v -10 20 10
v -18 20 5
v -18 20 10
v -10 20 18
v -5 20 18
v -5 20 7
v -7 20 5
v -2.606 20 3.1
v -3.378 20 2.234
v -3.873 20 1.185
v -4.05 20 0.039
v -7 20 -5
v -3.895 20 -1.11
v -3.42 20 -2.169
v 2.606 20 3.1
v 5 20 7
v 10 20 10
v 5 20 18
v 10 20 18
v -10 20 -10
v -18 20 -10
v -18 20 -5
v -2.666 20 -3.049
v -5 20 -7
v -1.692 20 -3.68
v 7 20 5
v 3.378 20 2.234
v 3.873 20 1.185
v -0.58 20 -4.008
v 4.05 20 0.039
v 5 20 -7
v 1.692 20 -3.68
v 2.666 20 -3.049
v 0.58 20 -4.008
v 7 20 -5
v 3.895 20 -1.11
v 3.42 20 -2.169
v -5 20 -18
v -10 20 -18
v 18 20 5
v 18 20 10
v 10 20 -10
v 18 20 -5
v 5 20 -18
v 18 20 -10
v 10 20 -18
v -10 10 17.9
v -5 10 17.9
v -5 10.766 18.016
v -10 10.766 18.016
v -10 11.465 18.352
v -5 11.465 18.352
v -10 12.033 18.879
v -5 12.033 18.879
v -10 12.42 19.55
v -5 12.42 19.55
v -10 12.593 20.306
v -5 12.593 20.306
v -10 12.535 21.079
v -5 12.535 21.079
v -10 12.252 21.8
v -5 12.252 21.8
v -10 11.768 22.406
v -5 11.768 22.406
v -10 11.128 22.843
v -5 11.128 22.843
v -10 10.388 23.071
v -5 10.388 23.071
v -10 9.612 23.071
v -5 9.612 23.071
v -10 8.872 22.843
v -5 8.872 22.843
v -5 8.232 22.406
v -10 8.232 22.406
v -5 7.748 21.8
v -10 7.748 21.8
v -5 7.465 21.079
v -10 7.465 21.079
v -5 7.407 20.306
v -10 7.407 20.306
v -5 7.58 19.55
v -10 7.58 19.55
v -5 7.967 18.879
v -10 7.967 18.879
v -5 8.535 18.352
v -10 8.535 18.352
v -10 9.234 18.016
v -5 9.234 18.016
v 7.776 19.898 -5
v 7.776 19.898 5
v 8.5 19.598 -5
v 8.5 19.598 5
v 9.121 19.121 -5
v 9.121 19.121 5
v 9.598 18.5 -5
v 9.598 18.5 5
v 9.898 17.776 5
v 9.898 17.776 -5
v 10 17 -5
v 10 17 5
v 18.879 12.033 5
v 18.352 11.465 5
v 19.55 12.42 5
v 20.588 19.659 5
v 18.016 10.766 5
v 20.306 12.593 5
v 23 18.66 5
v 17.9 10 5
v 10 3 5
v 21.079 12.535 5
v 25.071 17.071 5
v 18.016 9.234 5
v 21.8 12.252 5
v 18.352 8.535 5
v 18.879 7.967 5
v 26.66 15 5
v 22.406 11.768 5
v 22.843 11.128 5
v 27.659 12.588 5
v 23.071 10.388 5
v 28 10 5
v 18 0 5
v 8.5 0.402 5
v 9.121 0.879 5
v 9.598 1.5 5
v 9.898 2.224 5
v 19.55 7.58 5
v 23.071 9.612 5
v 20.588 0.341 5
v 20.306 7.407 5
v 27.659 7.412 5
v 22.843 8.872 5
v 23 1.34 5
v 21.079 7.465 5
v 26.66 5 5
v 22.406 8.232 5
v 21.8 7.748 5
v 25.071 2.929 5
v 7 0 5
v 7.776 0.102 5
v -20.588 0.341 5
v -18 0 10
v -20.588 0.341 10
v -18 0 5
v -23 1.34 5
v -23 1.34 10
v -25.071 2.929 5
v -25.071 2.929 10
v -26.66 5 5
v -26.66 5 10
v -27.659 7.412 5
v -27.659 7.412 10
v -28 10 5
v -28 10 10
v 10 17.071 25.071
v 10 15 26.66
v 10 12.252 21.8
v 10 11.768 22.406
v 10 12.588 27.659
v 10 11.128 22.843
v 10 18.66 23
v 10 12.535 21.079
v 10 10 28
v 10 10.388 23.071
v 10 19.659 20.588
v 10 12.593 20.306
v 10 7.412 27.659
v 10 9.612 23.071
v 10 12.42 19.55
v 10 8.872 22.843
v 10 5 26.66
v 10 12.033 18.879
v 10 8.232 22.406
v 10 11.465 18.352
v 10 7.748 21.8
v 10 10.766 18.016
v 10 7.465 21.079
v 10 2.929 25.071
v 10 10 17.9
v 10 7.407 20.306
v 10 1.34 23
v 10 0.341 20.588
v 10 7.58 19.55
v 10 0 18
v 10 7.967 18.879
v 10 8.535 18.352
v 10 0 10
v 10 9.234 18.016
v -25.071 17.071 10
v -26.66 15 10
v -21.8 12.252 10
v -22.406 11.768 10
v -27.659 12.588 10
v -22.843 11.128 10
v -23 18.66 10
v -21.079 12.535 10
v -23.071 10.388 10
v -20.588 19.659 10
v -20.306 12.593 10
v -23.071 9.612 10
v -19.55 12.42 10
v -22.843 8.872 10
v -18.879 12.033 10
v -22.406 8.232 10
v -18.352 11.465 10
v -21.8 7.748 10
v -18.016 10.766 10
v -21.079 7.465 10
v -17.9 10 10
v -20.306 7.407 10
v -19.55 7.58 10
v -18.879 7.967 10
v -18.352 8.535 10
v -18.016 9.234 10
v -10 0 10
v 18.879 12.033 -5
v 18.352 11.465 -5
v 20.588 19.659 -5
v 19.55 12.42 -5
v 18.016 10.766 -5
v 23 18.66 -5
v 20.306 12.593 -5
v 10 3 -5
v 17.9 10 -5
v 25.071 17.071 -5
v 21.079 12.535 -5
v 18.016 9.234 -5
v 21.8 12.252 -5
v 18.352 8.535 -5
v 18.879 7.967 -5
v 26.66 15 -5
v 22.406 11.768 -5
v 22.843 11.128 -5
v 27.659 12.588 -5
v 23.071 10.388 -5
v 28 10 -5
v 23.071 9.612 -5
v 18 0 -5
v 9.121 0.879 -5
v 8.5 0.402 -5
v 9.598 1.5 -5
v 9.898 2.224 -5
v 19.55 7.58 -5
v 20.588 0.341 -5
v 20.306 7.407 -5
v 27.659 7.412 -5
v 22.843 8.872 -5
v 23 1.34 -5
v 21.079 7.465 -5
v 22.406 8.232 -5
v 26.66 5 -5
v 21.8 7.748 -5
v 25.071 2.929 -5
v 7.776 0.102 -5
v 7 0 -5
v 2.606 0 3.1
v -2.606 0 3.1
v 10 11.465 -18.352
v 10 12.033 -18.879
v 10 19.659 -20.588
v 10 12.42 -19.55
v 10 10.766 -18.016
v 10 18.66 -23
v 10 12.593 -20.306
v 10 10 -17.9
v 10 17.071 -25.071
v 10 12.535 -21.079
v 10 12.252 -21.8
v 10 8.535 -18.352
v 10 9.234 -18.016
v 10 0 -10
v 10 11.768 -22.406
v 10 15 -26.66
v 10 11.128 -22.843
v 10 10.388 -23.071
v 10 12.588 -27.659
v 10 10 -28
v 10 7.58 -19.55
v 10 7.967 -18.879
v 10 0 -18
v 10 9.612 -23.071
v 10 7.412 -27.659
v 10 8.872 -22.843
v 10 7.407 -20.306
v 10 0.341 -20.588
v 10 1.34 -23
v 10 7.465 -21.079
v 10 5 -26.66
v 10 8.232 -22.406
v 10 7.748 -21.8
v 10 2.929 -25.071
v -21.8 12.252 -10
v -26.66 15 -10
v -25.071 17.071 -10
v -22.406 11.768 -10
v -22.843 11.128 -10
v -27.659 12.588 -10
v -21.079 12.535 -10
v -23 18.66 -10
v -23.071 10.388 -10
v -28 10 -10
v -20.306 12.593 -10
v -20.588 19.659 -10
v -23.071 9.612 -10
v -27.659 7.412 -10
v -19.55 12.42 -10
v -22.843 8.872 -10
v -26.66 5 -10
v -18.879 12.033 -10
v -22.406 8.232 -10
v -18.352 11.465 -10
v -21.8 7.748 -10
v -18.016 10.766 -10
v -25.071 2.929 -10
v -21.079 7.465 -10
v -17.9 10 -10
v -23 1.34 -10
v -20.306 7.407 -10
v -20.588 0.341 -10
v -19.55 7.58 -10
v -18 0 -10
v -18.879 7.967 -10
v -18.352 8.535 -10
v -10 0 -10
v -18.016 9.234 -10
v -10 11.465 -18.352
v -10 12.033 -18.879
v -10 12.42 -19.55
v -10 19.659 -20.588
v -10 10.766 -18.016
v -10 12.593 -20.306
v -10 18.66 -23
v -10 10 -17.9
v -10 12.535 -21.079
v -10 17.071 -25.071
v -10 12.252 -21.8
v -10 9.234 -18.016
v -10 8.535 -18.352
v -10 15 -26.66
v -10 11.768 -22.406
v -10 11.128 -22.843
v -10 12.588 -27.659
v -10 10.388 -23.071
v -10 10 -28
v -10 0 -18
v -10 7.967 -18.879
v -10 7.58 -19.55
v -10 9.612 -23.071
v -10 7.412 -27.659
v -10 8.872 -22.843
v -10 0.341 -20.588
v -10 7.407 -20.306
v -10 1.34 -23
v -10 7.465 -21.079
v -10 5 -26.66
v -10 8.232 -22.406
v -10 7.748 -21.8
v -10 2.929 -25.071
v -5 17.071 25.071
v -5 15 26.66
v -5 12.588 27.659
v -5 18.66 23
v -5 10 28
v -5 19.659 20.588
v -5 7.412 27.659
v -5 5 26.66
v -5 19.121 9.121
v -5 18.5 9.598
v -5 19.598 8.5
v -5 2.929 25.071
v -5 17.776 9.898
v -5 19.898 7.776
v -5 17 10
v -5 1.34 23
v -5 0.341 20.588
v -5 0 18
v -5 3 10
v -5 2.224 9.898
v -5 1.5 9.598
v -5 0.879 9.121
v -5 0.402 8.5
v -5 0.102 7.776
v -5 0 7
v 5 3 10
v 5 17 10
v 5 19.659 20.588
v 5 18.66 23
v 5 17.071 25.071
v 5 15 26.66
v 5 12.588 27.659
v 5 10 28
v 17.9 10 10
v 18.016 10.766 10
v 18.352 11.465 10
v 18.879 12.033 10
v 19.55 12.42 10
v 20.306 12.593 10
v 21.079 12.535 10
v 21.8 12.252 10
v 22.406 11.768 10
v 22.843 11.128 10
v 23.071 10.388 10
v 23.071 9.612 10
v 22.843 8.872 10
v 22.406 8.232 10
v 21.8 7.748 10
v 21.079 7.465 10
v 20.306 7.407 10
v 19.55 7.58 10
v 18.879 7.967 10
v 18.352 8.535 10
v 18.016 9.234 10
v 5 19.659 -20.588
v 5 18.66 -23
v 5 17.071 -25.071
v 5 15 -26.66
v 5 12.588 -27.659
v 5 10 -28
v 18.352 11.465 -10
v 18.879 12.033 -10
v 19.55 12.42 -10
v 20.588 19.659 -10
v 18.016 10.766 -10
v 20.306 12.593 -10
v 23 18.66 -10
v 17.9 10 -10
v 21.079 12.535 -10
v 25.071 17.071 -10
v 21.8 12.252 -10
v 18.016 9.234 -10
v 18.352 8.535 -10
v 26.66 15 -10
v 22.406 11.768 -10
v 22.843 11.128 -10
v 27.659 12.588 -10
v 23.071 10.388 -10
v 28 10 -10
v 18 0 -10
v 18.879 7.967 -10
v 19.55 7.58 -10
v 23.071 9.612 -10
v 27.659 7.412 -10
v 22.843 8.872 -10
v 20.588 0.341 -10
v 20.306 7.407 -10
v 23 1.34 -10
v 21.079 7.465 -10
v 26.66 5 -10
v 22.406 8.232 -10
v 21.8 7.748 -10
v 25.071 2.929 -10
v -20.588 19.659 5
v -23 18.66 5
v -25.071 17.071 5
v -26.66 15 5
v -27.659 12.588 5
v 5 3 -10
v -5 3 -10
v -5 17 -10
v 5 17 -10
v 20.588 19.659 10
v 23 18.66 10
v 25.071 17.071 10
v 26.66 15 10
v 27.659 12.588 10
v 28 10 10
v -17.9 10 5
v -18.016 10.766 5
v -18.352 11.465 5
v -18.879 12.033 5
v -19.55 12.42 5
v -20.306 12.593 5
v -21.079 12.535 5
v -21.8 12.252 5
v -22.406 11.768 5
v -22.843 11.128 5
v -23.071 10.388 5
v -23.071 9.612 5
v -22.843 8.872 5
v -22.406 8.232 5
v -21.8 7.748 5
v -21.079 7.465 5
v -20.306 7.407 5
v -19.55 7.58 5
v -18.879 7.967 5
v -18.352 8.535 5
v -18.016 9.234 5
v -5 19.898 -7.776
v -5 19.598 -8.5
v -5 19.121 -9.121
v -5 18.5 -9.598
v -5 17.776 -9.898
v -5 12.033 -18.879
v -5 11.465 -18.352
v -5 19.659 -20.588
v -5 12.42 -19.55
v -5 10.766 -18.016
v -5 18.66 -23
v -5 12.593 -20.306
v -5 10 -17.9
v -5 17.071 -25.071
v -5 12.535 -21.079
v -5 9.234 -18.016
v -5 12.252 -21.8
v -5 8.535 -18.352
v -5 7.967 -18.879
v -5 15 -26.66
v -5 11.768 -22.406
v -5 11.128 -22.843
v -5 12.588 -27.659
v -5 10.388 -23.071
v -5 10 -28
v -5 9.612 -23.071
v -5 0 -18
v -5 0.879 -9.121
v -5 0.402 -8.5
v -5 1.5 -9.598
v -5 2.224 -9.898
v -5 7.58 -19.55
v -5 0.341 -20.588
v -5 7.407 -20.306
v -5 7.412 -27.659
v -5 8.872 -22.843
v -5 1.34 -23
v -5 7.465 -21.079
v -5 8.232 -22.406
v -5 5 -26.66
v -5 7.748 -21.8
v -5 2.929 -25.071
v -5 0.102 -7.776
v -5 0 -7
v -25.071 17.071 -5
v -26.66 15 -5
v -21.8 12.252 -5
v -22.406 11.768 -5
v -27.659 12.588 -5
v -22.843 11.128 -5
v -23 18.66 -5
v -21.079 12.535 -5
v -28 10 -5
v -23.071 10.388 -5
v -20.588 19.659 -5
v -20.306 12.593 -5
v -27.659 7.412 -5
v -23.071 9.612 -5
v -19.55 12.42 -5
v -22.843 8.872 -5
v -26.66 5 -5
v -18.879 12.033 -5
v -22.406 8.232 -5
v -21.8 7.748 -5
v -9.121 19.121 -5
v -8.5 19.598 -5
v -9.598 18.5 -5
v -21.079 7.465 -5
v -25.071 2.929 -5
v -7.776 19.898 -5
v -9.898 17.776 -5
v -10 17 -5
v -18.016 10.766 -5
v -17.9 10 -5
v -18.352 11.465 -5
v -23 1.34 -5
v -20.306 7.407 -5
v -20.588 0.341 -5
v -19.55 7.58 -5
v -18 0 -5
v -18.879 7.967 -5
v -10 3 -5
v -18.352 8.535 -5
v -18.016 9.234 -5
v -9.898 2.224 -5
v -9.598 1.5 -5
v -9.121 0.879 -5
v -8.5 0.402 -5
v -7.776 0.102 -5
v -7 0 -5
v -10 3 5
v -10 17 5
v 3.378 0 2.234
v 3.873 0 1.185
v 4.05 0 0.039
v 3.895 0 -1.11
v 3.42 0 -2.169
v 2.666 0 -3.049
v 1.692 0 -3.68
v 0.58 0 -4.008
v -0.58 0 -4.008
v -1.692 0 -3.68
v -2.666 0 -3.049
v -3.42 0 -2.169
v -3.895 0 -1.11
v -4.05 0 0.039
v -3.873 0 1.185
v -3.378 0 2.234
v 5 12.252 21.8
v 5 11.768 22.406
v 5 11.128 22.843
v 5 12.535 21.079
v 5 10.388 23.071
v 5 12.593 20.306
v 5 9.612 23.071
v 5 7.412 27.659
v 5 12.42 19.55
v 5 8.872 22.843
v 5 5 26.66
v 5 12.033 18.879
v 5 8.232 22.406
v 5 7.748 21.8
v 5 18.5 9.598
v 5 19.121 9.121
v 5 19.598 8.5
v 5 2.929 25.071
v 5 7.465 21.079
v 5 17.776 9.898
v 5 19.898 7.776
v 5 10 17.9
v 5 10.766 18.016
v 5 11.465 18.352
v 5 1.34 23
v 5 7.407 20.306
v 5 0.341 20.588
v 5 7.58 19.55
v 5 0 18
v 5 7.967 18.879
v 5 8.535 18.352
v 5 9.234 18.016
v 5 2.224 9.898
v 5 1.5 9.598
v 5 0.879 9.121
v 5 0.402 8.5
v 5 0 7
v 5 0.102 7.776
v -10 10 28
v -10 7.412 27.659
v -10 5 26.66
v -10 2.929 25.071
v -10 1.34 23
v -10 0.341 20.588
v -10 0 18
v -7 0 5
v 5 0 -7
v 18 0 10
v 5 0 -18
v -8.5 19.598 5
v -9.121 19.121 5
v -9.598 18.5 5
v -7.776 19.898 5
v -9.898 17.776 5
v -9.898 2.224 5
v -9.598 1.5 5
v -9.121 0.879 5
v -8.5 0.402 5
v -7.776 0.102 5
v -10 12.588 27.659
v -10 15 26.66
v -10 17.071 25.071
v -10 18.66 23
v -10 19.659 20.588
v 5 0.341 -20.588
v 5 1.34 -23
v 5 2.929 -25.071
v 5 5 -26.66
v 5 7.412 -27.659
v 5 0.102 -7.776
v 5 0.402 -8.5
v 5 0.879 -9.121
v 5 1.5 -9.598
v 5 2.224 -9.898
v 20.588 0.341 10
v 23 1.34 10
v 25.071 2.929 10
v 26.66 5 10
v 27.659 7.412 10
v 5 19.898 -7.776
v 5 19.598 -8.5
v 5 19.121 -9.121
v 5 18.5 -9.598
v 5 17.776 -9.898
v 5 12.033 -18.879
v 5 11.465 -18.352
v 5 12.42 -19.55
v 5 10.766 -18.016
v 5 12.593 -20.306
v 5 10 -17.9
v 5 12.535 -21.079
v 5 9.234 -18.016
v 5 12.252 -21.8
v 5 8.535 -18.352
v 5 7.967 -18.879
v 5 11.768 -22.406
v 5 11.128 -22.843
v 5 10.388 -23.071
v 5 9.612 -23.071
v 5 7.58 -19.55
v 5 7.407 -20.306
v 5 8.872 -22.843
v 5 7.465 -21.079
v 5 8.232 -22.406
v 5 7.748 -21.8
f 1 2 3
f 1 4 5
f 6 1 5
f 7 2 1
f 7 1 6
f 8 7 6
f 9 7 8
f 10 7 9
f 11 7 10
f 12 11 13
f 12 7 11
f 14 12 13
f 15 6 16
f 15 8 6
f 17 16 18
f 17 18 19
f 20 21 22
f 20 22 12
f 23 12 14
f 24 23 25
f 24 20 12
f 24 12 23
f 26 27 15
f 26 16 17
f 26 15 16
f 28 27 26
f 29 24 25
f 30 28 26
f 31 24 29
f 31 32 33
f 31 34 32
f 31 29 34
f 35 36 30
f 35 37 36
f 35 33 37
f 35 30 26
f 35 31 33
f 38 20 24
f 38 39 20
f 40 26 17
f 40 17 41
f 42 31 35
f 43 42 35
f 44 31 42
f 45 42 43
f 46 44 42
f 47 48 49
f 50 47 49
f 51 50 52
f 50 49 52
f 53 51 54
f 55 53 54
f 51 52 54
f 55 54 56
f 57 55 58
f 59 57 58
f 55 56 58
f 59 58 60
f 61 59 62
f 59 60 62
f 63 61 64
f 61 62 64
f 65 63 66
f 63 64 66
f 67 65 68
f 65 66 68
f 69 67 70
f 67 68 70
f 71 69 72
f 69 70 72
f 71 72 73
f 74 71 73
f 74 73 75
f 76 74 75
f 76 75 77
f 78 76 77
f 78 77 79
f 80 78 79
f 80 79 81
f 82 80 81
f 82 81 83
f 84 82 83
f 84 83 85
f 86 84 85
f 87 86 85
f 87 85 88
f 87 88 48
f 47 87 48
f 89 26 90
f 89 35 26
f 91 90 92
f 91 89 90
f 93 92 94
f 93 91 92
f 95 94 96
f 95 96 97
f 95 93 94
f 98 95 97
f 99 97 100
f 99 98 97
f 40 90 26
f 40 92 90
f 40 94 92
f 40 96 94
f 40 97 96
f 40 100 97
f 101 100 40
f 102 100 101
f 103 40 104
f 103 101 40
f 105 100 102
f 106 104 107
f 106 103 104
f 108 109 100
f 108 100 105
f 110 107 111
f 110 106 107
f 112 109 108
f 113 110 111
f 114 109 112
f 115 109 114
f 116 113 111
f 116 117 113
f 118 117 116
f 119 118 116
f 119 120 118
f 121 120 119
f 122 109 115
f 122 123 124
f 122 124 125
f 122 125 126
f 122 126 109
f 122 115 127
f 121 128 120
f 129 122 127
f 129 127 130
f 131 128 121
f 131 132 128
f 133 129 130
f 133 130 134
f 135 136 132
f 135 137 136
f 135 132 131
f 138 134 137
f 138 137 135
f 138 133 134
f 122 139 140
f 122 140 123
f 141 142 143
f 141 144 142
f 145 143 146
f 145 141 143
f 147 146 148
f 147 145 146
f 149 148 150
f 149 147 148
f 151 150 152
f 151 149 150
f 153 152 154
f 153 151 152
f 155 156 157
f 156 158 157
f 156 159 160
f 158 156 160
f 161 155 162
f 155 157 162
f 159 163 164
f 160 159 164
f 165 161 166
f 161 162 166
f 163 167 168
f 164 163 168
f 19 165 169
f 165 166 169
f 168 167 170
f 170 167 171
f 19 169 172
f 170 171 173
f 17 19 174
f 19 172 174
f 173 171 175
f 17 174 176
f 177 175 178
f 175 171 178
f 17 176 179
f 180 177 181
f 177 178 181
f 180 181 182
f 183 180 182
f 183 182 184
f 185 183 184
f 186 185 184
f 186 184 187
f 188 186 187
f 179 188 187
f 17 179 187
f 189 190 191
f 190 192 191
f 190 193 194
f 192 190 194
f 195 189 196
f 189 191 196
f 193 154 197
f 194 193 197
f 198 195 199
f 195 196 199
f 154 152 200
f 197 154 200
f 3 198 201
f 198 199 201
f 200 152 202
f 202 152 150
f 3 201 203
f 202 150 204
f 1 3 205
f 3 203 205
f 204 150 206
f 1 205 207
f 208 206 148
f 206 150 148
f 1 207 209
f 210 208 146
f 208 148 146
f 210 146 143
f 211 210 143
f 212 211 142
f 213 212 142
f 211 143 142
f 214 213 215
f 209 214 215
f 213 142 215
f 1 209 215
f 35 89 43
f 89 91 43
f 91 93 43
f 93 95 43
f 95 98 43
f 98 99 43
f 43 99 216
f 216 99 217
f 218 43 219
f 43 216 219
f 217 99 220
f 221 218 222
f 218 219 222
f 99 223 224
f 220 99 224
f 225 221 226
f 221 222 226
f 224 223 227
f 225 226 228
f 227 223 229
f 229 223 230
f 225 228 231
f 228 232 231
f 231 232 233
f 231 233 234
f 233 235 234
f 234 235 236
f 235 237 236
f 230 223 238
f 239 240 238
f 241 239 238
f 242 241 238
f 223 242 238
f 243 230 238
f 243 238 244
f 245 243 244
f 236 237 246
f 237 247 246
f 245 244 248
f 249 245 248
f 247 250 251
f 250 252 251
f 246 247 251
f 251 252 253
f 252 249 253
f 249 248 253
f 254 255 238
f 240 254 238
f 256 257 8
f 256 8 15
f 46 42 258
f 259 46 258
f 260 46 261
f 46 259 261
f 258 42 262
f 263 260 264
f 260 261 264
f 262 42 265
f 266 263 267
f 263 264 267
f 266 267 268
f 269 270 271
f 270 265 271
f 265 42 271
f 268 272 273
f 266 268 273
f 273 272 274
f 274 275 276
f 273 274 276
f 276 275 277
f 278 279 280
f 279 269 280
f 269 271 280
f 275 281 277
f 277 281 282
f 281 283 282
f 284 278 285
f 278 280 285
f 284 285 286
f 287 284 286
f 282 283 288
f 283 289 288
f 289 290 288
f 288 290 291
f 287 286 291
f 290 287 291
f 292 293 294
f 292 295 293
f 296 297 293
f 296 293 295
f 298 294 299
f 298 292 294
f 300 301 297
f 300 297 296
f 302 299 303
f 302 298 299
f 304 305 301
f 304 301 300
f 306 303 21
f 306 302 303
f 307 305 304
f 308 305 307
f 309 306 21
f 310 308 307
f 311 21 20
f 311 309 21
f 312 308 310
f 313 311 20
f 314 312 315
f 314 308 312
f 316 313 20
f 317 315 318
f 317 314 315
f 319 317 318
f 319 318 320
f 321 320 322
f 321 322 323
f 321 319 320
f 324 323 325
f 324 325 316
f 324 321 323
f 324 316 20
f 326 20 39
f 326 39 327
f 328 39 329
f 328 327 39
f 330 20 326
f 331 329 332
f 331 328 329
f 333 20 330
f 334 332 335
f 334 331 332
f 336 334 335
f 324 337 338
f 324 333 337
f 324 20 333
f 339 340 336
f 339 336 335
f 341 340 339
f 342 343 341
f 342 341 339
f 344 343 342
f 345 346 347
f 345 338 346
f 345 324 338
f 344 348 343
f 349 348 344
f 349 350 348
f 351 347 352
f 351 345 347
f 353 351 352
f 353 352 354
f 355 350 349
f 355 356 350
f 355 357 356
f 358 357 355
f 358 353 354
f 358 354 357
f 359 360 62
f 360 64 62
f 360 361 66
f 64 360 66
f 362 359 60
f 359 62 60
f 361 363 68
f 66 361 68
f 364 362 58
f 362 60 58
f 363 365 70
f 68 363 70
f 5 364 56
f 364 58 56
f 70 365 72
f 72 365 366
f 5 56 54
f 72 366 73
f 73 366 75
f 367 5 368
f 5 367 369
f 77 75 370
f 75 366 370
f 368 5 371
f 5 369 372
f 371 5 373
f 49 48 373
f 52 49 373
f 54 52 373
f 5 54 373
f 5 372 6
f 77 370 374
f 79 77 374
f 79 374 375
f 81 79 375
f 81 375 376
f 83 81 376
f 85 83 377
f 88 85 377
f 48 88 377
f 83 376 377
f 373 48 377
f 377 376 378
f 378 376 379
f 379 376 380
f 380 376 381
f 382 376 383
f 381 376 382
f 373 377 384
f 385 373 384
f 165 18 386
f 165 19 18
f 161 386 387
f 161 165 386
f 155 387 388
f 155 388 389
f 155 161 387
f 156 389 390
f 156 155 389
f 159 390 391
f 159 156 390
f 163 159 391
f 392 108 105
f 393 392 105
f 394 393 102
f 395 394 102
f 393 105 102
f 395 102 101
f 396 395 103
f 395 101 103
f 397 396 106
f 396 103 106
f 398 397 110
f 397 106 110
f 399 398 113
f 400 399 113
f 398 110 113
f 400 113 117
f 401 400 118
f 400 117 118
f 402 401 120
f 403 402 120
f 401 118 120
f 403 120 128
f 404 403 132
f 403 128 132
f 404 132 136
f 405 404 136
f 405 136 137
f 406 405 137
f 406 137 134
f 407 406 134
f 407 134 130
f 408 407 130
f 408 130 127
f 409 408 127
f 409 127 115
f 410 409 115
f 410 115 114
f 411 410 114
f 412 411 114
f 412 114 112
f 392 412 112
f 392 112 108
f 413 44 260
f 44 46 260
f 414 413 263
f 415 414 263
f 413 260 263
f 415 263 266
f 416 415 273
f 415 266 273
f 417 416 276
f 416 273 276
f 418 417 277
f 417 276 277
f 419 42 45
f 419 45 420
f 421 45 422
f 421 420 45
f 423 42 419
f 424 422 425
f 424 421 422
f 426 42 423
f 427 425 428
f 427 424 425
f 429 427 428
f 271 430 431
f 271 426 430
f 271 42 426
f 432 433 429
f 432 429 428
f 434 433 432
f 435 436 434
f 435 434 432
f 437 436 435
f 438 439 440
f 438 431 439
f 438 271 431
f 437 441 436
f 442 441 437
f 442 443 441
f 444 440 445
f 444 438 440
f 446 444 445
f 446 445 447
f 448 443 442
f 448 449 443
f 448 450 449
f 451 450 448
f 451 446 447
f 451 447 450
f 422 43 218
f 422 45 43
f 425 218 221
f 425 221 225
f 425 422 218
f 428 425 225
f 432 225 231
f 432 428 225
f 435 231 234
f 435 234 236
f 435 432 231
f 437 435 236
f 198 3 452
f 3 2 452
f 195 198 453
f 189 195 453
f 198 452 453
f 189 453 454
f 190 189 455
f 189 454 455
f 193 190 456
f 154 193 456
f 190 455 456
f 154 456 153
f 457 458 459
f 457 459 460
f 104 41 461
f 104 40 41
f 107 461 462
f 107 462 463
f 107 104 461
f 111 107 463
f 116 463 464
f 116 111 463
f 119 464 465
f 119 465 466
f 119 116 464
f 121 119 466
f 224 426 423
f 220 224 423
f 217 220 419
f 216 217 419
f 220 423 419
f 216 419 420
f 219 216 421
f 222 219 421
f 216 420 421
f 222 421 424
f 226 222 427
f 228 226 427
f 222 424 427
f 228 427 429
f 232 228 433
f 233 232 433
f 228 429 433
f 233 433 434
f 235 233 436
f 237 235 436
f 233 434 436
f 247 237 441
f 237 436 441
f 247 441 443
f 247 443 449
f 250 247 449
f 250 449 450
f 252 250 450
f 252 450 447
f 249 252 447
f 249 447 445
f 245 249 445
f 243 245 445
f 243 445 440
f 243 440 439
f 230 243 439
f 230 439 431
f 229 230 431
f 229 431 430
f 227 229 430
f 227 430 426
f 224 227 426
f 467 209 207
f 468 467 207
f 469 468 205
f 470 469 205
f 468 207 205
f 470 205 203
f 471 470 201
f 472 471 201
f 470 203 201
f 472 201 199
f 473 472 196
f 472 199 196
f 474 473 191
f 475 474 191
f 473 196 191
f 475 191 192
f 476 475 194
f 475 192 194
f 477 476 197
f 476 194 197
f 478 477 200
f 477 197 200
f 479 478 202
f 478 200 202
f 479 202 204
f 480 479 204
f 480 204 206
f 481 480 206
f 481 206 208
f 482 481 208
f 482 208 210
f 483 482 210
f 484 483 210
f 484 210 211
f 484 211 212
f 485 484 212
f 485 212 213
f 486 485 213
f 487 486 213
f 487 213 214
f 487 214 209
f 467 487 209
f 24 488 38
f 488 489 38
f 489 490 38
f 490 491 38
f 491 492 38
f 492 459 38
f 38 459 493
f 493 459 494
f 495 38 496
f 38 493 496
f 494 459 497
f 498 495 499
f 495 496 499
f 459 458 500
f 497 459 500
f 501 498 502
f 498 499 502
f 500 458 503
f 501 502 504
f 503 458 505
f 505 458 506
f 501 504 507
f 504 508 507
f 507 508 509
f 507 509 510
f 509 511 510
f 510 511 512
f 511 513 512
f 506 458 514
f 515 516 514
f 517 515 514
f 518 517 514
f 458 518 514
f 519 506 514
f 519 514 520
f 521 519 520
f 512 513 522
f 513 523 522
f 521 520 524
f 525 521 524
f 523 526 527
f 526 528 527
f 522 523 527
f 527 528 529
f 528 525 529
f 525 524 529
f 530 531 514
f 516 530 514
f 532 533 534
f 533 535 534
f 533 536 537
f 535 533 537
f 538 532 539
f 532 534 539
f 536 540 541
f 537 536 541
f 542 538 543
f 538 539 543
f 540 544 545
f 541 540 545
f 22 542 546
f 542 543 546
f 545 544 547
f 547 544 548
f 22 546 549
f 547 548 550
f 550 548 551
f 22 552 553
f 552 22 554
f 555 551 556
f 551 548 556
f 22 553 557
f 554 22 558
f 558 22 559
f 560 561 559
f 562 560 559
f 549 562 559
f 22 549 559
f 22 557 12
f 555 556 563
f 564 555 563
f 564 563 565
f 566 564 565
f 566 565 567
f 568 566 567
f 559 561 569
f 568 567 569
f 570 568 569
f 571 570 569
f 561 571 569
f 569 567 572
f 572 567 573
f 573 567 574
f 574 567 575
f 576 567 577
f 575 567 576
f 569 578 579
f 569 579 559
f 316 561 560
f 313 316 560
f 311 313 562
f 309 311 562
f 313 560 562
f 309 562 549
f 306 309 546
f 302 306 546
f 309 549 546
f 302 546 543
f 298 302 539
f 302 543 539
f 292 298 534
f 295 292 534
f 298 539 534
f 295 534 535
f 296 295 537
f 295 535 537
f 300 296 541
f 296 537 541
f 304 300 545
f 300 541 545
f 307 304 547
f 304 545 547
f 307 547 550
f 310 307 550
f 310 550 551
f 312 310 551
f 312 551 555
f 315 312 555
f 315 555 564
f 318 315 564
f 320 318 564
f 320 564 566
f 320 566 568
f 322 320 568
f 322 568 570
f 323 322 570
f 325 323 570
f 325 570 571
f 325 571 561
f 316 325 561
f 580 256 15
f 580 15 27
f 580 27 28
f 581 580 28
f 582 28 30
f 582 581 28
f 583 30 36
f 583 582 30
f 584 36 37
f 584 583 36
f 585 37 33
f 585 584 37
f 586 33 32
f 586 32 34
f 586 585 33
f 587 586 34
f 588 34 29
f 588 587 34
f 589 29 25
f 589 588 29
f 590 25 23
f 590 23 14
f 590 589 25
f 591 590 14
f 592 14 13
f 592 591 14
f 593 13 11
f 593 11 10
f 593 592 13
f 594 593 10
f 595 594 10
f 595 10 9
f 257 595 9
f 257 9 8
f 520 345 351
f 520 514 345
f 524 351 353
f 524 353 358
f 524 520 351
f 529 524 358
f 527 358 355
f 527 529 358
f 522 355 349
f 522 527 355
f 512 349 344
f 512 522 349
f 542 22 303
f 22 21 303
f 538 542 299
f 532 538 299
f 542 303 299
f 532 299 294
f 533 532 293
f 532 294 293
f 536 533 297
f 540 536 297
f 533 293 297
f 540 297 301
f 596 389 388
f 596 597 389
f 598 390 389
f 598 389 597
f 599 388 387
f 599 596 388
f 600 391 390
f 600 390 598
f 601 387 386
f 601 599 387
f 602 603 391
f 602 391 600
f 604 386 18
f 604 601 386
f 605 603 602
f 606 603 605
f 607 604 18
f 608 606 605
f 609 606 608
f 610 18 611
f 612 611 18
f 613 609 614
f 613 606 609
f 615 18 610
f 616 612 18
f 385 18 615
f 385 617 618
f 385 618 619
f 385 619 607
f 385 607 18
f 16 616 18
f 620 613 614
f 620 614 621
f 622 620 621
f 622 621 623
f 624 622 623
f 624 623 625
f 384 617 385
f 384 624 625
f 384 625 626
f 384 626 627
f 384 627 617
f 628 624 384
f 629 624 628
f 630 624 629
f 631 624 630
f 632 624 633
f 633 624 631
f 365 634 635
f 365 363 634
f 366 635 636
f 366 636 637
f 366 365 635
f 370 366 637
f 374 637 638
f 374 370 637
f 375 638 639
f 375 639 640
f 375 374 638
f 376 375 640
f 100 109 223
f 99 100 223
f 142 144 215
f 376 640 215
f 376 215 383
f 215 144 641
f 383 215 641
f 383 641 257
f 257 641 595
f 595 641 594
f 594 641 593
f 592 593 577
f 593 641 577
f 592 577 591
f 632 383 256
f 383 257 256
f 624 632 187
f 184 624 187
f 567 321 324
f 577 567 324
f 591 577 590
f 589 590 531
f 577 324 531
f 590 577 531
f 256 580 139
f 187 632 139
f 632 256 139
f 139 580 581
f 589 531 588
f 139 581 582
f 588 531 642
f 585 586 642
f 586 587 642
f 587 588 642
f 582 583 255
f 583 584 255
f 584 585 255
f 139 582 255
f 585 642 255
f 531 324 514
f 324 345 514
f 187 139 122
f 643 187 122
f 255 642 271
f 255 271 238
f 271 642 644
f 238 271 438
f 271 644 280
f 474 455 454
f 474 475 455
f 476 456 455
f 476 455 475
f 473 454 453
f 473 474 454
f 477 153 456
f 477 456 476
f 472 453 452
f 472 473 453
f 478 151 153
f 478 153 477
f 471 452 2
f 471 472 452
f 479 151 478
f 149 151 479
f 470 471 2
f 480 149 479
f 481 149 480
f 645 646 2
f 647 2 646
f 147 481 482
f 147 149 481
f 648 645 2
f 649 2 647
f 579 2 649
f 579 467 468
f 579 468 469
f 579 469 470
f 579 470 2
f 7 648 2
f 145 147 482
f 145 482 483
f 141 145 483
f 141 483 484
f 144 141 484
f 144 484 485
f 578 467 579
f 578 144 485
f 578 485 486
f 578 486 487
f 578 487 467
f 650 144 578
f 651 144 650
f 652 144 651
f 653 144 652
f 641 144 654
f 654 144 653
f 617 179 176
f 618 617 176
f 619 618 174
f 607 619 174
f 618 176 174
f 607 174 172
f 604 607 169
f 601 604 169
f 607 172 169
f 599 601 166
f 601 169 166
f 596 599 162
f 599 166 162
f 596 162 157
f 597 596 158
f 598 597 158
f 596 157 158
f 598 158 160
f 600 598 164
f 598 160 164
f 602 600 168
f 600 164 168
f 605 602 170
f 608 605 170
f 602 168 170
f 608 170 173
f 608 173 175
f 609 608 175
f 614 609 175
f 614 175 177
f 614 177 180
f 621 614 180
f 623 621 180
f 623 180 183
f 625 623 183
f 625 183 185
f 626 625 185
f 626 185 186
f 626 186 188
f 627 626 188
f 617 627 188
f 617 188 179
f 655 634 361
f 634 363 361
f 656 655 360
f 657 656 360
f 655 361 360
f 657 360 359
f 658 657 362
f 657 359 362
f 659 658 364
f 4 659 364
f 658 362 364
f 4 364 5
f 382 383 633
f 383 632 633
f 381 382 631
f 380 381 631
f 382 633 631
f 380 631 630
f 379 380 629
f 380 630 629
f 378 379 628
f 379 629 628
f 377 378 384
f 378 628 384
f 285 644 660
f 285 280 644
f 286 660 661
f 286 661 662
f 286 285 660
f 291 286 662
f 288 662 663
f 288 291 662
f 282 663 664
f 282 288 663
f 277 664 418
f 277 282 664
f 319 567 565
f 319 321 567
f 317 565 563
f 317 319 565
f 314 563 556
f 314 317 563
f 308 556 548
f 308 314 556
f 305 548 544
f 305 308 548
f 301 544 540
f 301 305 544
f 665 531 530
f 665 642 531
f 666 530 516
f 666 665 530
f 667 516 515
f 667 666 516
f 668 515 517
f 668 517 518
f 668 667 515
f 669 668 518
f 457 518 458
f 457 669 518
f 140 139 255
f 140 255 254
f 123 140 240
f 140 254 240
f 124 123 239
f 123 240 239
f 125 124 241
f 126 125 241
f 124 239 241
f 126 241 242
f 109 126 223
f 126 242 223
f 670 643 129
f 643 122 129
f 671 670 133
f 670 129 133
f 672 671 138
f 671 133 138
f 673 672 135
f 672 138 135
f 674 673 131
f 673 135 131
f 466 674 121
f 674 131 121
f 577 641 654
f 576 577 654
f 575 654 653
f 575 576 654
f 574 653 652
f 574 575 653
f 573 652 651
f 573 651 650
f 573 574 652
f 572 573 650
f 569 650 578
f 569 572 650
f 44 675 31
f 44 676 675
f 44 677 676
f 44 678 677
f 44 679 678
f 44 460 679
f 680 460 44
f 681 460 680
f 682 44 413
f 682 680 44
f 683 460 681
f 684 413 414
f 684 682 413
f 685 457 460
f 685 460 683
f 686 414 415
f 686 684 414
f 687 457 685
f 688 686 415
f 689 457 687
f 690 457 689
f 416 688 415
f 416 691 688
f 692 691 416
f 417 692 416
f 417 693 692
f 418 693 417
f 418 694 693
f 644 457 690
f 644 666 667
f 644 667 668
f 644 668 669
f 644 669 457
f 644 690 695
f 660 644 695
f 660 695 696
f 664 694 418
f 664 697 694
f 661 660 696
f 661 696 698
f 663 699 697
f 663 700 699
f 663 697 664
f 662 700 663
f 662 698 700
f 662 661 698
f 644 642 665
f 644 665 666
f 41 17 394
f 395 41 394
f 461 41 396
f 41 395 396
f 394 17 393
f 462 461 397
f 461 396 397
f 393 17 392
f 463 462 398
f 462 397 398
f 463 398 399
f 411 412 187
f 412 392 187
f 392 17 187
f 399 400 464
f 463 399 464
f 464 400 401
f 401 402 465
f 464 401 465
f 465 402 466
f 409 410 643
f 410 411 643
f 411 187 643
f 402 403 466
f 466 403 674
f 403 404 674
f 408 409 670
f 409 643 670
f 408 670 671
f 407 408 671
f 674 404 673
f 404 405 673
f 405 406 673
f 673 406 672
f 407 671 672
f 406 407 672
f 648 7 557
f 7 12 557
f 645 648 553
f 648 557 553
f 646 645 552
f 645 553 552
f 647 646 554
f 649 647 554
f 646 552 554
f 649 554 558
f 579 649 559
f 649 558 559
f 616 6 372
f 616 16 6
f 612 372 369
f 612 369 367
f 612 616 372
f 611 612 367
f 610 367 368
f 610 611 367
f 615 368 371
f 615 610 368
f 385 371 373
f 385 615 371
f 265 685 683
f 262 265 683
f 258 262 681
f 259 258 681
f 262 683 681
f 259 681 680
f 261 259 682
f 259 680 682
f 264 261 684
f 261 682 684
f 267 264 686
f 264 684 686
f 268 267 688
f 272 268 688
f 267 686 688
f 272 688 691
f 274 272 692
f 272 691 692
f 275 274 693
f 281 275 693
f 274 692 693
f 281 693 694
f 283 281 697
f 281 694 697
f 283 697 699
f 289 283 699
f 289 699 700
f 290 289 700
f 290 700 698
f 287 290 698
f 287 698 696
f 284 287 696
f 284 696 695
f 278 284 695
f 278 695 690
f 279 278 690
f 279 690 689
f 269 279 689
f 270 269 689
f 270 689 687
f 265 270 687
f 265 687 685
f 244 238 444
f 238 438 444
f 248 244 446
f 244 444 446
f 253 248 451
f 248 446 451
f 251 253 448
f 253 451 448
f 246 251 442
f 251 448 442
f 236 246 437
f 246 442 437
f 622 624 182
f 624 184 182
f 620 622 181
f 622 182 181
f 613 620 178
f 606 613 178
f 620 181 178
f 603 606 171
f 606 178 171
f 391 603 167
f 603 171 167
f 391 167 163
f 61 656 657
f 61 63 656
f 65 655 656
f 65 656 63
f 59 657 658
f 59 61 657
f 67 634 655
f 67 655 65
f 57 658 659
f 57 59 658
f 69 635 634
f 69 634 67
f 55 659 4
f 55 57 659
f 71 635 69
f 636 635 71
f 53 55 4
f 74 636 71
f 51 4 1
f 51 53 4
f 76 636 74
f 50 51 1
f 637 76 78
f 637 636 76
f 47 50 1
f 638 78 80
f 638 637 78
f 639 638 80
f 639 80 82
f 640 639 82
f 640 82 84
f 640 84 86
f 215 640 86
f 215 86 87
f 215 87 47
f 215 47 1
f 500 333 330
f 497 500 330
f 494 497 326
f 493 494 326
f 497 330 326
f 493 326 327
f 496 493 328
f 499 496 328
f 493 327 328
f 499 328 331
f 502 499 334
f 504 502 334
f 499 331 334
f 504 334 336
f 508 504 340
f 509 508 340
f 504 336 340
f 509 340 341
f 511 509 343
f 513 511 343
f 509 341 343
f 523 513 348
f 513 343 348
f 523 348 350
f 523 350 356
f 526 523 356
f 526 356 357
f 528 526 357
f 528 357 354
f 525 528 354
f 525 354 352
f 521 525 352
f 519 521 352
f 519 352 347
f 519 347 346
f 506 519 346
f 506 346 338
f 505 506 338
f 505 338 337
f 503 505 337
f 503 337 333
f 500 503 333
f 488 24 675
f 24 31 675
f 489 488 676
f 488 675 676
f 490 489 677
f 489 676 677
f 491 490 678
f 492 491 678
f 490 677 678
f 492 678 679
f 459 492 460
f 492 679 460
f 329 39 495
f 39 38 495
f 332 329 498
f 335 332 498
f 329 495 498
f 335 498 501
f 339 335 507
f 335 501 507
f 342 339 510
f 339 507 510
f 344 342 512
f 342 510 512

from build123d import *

# Parameters (mm, degrees)
SKETCH1_W           = 20
SKETCH1_H           = 20
SKETCH1_W_2         = 18
SKETCH1_H_2         = 5
SKETCH1_W_3         = 5
SKETCH1_H_3         = 18
BOSS_EXTRUDE1_DEPTH = 20
FILLET1_R           = 10
SKETCH2_R           = 2.6
CUT_EXTRUDE1_DEPTH  = 20
CIRPATTERN1_COUNT   = 4
FILLET2_R           = 3


with BuildPart() as part:
    # Sketch1 → Boss-Extrude1 (new body)
    # profile 1 of 9: a face of its own
    with BuildSketch(Plane(origin=(0, 0, 0), x_dir=(1, 0, 0), z_dir=(0, 1, 0))):
        Rectangle(SKETCH1_W, SKETCH1_H)
        with BuildLine():
            ThreePointArc((2.606242506, -3.1), (0, 4.05), (-2.606242506, -3.1))
            Line((-2.606242506, -3.1), (2.606242506, -3.1))
        make_face(mode=Mode.SUBTRACT)
    # profile 2 of 9: a face of its own
    with BuildSketch(Plane(origin=(0, 0, 0), x_dir=(1, 0, 0), z_dir=(0, 1, 0))):
        with Locations((-19, -7.5)):
            Rectangle(SKETCH1_W_2, SKETCH1_H_2)
    # profile 3 of 9: a face of its own
    with BuildSketch(Plane(origin=(0, 0, 0), x_dir=(1, 0, 0), z_dir=(0, 1, 0))):
        with Locations((-19, 7.5)):
            Rectangle(SKETCH1_W_2, SKETCH1_H_2)
    # profile 4 of 9: a face of its own
    with BuildSketch(Plane(origin=(0, 0, 0), x_dir=(1, 0, 0), z_dir=(0, 1, 0))):
        with Locations((-7.5, 19)):
            Rectangle(SKETCH1_W_3, SKETCH1_H_3)
    # profile 5 of 9: a face of its own
    with BuildSketch(Plane(origin=(0, 0, 0), x_dir=(1, 0, 0), z_dir=(0, 1, 0))):
        with Locations((7.5, 19)):
            Rectangle(SKETCH1_W_3, SKETCH1_H_3)
    # profile 6 of 9: a face of its own
    with BuildSketch(Plane(origin=(0, 0, 0), x_dir=(1, 0, 0), z_dir=(0, 1, 0))):
        with Locations((19, 7.5)):
            Rectangle(SKETCH1_W_2, SKETCH1_H_2)
    # profile 7 of 9: a face of its own
    with BuildSketch(Plane(origin=(0, 0, 0), x_dir=(1, 0, 0), z_dir=(0, 1, 0))):
        with Locations((19, -7.5)):
            Rectangle(SKETCH1_W_2, SKETCH1_H_2)
    # profile 8 of 9: a face of its own
    with BuildSketch(Plane(origin=(0, 0, 0), x_dir=(1, 0, 0), z_dir=(0, 1, 0))):
        with Locations((7.5, -19)):
            Rectangle(SKETCH1_W_3, SKETCH1_H_3)
    # profile 9 of 9: a face of its own
    with BuildSketch(Plane(origin=(0, 0, 0), x_dir=(1, 0, 0), z_dir=(0, 1, 0))):
        with Locations((-7.5, -19)):
            Rectangle(SKETCH1_W_3, SKETCH1_H_3)
    extrude(amount=BOSS_EXTRUDE1_DEPTH)

    # Fillet1
    fillet1_edges = [part.edges().sort_by_distance(p)[0] for p in [
        (-28, 0, 7.5),
        (-28, 20, 7.5),
        (-28, 0, -7.5),
        (-28, 20, -7.5),
        (-7.5, 0, -28),
        (-7.5, 20, -28),
        (7.5, 0, -28),
        (7.5, 20, -28),
        (28, 0, -7.5),
        (28, 20, -7.5),
        (28, 0, 7.5),
        (28, 20, 7.5),
        (7.5, 0, 28),
        (7.5, 20, 28),
        (-7.5, 0, 28),
        (-7.5, 20, 28),
    ]]
    fillet(fillet1_edges, radius=FILLET1_R - 0.0001)  # a hair under: the kernel refuses the full size

    # Sketch2 → Cut-Extrude1 (cut)
    with BuildSketch(Plane.XY.offset(10)):
        with Locations((-20.5, 10)):
            Circle(SKETCH2_R)
    cut_extrude1 = extrude(amount=-CUT_EXTRUDE1_DEPTH, mode=Mode.SUBTRACT)

    # CirPattern1: Cut-Extrude1 ×4 about axis
    cirpattern1_axis = Axis((0, 21, 0), (0, -1, 0))
    for i in range(1, CIRPATTERN1_COUNT):
        add(cut_extrude1.rotate(cirpattern1_axis, i * 360 / CIRPATTERN1_COUNT), mode=Mode.SUBTRACT)

    # Fillet2
    fillet2_edges = [part.edges().sort_by_distance(p)[0] for p in [
        (-10, 20, 0),
        (0, 20, 10),
        (-10, 0, 0),
        (0, 0, -10),
        (10, 0, 0),
        (0, 0, 10),
        (10, 20, 0),
        (0, 20, -10),
    ]]
    fillet(fillet2_edges, radius=FILLET2_R)


solid = part.part
